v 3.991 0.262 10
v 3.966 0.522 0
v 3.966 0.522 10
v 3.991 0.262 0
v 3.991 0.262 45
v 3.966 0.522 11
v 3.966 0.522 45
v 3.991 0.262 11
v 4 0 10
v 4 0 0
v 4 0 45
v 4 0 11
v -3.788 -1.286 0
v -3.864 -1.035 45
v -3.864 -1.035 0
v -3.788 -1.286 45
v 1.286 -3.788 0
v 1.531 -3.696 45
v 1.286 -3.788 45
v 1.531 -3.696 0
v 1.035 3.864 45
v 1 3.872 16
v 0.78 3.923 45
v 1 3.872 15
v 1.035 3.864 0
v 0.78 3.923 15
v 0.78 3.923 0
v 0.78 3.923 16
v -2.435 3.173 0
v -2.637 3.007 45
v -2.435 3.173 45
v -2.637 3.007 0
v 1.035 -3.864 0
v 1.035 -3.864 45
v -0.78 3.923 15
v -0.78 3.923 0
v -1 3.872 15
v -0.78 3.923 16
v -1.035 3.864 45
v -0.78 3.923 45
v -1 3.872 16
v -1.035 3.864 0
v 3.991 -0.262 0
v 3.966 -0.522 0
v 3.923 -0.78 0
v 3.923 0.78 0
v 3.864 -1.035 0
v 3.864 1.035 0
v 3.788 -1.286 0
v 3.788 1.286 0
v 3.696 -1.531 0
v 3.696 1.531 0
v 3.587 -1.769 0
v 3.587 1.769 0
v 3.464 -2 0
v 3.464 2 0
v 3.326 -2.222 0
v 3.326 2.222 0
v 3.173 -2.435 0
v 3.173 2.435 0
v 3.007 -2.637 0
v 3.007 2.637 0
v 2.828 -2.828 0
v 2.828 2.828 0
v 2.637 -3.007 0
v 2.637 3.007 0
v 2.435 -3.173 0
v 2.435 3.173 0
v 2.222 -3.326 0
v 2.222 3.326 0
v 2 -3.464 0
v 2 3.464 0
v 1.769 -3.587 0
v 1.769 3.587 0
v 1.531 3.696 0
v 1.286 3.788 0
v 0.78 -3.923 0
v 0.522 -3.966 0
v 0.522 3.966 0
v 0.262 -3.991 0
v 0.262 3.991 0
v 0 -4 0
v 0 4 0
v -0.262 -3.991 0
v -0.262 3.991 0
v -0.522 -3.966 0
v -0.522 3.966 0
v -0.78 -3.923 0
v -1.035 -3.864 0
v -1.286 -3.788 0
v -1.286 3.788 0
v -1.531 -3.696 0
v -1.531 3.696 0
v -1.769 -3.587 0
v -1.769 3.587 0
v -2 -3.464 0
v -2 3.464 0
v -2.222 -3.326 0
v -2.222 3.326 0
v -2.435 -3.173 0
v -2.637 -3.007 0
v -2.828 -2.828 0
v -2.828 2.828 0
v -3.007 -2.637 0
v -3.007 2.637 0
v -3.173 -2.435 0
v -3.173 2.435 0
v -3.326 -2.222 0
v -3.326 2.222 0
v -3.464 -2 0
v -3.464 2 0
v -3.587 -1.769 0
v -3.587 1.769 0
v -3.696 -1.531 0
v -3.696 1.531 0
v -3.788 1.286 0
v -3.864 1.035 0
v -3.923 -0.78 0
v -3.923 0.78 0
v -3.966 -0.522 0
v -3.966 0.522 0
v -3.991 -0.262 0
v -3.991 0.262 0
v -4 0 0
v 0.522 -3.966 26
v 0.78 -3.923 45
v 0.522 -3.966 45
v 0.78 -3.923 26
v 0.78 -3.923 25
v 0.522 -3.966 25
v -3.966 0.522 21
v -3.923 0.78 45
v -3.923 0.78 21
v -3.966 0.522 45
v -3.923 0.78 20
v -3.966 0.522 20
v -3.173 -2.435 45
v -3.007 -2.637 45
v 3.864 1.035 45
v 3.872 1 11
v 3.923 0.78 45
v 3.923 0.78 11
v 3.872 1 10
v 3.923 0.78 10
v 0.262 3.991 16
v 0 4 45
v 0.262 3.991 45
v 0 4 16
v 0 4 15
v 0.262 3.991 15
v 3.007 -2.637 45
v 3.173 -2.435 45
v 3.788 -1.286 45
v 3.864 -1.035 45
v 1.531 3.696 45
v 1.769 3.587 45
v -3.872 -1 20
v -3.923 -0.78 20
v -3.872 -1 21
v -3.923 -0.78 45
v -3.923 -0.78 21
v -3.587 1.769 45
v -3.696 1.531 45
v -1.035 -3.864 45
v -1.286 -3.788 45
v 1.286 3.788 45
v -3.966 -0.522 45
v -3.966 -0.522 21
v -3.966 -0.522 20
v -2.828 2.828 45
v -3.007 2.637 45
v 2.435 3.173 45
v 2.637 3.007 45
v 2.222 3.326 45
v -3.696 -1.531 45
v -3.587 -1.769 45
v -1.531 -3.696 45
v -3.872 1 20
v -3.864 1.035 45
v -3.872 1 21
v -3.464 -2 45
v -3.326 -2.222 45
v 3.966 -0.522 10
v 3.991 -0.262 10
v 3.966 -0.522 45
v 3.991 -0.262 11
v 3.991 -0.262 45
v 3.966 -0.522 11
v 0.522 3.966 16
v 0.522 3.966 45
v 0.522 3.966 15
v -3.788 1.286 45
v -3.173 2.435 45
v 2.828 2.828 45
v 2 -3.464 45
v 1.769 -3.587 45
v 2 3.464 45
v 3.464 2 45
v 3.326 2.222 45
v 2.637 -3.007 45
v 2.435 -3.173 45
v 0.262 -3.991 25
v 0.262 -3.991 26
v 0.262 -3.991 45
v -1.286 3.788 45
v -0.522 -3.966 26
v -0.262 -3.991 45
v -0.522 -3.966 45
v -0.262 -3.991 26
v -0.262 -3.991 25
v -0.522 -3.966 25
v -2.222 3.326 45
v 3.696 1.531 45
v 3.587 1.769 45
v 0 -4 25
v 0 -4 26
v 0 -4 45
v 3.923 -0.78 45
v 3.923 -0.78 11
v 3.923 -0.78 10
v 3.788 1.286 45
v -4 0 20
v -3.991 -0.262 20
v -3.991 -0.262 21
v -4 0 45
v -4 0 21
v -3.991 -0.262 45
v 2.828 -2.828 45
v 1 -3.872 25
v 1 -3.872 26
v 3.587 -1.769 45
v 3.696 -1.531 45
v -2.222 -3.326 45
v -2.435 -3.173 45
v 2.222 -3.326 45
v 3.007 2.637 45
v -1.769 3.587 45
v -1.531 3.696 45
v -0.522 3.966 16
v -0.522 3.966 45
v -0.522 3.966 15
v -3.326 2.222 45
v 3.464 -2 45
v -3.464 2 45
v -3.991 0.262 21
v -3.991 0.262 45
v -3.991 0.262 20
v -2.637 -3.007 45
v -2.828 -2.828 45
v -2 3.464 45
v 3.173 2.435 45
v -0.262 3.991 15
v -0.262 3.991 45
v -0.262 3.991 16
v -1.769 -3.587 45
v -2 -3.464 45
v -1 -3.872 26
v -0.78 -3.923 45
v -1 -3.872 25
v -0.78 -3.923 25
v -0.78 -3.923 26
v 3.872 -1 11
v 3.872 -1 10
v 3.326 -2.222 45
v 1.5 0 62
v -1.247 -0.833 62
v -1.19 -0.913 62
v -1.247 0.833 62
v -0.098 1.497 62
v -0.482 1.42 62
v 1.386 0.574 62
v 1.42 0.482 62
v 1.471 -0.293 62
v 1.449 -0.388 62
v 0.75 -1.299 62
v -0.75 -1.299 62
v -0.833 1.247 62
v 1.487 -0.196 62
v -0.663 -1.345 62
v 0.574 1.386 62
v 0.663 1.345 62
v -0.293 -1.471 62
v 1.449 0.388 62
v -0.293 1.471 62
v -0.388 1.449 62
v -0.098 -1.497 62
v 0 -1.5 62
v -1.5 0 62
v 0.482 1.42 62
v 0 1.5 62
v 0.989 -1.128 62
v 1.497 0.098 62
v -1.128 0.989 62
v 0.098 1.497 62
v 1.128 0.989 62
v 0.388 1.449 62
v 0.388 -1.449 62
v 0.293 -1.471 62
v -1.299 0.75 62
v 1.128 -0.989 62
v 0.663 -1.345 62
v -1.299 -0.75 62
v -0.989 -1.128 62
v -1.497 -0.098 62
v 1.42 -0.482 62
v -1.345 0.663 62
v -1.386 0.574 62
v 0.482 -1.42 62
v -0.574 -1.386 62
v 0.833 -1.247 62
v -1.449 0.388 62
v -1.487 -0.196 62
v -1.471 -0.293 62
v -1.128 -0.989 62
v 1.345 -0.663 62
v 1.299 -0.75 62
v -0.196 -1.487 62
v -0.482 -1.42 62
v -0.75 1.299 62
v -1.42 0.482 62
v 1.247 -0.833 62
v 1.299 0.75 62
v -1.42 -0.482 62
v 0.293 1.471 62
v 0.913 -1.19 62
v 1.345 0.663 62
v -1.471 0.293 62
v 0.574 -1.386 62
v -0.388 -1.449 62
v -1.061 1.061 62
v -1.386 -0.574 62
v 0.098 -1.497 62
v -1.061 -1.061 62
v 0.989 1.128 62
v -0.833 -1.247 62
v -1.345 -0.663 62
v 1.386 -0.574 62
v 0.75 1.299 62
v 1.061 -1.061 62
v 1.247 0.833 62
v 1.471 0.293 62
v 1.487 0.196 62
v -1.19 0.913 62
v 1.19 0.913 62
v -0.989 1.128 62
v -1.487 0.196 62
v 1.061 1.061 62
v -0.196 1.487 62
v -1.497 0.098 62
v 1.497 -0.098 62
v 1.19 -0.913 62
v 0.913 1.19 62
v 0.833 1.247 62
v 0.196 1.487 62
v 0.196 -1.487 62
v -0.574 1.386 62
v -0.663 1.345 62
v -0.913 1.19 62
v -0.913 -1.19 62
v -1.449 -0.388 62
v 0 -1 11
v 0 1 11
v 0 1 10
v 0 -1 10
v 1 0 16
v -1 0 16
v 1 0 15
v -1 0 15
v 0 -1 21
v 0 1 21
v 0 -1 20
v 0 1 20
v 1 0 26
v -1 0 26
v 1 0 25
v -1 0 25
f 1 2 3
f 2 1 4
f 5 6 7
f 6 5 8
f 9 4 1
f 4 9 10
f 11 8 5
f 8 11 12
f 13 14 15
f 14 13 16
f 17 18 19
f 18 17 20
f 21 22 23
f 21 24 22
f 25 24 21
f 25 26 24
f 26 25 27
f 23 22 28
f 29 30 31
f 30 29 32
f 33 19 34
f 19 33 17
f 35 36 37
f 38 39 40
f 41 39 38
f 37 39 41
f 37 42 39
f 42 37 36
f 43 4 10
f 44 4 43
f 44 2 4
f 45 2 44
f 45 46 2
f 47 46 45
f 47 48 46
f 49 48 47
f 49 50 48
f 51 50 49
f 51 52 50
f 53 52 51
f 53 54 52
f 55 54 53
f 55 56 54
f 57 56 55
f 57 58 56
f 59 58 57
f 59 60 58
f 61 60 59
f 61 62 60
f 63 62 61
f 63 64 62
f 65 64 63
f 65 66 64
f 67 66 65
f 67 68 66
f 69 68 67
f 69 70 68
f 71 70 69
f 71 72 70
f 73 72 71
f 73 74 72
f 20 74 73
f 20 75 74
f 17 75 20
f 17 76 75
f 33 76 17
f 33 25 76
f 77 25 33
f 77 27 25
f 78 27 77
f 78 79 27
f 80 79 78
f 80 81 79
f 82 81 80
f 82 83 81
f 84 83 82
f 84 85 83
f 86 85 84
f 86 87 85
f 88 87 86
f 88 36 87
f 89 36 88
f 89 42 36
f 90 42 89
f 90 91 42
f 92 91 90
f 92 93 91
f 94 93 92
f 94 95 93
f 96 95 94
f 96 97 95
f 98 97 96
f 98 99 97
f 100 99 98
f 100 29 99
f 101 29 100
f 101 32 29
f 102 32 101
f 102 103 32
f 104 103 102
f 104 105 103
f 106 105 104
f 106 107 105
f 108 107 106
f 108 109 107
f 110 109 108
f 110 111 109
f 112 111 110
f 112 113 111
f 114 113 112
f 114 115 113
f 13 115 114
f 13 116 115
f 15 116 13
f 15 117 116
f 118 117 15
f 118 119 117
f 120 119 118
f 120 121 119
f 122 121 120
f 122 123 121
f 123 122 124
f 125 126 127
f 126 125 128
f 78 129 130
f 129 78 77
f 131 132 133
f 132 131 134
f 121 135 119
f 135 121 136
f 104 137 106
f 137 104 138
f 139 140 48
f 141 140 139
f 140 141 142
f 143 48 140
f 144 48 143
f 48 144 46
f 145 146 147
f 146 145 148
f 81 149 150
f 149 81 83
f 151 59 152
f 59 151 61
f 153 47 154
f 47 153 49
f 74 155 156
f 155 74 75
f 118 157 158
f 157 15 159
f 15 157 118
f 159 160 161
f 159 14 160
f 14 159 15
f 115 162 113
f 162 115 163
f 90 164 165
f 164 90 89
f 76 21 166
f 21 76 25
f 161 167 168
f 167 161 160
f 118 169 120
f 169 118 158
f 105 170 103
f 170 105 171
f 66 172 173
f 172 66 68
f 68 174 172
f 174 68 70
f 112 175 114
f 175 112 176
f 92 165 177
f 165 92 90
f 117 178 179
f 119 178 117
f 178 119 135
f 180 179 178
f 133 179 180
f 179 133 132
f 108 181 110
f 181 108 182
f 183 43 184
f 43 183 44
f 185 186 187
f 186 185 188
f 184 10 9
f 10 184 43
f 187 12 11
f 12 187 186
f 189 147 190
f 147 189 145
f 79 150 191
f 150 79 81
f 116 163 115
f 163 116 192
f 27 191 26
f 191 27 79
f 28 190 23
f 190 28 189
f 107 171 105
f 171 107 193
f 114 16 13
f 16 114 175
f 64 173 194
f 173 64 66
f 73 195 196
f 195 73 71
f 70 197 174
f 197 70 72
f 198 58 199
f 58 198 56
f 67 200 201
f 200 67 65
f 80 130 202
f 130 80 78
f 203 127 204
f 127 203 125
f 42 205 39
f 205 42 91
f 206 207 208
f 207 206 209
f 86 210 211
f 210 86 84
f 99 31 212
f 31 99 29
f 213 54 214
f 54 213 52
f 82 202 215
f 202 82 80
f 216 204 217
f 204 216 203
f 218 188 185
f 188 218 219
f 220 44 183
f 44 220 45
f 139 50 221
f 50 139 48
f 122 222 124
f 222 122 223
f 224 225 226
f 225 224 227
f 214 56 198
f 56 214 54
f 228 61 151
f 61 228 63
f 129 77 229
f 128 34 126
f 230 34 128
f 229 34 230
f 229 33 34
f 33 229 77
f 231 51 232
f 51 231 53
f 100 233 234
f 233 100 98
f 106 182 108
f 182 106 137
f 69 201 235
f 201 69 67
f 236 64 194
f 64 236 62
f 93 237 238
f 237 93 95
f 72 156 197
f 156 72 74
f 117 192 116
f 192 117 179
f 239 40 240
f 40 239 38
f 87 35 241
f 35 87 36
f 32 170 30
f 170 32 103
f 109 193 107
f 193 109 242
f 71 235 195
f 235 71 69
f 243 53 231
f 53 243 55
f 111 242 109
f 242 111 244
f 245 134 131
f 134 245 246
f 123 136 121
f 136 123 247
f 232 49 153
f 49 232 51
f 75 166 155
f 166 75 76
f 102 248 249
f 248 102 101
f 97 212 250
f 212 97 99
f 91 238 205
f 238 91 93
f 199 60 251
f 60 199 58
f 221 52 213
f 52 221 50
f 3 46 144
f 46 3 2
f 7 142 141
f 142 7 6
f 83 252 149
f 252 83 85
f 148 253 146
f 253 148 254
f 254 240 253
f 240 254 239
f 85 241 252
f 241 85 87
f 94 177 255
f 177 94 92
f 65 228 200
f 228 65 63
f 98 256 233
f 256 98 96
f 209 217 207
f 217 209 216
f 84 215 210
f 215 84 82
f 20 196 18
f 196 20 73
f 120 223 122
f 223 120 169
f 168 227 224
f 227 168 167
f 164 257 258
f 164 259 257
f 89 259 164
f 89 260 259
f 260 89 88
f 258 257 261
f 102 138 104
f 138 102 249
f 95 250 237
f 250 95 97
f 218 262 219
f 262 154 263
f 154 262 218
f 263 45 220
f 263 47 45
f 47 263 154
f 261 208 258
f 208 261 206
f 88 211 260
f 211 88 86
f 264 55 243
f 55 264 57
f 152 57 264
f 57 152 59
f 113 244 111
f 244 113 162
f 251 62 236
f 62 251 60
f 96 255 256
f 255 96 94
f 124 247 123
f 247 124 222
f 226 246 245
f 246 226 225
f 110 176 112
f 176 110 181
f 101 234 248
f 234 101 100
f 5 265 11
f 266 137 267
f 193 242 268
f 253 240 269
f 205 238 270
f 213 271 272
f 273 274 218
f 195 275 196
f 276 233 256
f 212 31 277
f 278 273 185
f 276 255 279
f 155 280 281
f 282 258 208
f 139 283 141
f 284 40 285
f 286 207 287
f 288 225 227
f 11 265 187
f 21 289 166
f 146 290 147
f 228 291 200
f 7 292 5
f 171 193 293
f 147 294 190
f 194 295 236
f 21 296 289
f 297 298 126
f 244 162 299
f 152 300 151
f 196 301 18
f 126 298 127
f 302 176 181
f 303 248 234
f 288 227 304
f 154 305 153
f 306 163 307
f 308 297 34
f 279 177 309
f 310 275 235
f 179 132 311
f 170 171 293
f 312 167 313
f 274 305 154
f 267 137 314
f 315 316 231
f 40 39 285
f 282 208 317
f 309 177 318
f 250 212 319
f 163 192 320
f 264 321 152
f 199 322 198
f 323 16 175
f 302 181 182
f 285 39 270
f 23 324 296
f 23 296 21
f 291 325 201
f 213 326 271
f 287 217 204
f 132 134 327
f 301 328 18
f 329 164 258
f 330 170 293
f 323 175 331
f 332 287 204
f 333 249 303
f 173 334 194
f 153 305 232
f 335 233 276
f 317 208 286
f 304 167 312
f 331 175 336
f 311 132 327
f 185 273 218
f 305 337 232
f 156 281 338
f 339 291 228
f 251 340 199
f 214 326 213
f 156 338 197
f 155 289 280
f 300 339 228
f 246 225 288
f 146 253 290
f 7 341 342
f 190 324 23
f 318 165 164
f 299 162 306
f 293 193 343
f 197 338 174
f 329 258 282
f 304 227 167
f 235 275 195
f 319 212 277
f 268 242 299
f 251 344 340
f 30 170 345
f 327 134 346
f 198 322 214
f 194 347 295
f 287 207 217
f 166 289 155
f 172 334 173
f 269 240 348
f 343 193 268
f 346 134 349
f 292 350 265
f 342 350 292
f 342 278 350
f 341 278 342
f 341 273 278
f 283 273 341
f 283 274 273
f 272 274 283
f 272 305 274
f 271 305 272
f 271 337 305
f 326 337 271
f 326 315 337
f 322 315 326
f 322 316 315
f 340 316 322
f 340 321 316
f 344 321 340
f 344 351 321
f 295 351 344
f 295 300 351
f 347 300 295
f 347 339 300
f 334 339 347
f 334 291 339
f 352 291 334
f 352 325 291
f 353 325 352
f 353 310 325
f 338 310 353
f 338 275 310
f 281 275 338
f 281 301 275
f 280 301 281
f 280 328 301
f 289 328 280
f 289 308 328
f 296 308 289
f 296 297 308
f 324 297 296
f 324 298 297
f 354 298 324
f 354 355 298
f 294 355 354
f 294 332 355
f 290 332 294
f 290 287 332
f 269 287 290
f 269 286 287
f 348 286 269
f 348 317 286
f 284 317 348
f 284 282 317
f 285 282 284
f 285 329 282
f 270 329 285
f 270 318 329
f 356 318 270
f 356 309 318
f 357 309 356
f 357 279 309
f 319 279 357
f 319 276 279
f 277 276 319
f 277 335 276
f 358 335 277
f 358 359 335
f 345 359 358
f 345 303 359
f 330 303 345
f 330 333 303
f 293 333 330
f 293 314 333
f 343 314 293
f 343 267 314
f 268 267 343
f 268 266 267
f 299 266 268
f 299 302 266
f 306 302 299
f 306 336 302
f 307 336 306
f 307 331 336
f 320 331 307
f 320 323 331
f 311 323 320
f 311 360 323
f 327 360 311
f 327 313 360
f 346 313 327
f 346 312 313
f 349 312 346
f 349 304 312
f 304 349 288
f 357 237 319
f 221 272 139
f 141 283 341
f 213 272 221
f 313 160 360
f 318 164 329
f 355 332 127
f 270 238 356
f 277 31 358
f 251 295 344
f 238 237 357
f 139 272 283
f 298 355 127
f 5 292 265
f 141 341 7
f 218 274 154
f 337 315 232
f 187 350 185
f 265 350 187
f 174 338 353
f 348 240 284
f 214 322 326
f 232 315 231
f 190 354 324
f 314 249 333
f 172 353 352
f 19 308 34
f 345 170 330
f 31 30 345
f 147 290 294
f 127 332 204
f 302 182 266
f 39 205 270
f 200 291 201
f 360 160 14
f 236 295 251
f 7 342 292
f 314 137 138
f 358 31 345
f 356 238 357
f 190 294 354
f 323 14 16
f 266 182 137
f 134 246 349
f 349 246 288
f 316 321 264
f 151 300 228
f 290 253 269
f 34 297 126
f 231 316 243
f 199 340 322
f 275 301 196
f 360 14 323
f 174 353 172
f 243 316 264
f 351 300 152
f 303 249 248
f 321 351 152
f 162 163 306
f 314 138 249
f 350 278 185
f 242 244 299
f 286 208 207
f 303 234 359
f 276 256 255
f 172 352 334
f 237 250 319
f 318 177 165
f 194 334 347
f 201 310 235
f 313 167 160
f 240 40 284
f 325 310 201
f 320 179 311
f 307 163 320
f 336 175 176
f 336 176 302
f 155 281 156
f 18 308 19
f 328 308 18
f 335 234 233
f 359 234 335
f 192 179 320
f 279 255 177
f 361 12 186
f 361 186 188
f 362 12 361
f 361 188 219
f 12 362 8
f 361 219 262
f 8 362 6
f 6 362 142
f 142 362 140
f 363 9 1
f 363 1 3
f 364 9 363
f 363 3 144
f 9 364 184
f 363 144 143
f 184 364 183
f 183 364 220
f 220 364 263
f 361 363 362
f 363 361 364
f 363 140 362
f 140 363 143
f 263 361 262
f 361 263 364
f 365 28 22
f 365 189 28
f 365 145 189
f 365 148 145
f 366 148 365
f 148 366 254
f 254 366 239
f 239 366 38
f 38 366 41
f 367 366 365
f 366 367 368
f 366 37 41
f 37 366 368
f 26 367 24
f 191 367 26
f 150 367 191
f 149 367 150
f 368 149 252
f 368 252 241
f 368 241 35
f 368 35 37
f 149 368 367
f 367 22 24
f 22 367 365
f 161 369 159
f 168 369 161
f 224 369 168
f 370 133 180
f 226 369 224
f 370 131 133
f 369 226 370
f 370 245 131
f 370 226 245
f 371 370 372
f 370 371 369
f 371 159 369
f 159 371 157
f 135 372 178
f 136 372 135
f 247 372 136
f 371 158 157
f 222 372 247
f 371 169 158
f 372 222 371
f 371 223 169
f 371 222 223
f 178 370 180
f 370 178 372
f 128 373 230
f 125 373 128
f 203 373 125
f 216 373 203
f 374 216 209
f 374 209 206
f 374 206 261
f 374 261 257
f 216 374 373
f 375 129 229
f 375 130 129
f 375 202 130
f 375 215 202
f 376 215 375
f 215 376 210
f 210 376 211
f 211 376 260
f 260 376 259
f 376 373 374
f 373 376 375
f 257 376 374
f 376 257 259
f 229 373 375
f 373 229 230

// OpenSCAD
// Tissue-grinding pestle for a 1.5 mL microcentrifuge tube
// Print orientation: standing upright on the XY plane, z = 0 at the bottom.

// ---------------- Parameters ----------------
handle_d      = 8;     // handle diameter (mm)
handle_h      = 45;    // handle height (mm), z = 0 to 45

cone_top_d    = 8;     // cone diameter at the top (mm), z = 45
cone_bottom_d = 3;     // cone diameter at the bottom (mm), z = 62
cone_h        = 17;    // cone height (mm), z = 45 to 62

tip_d         = 3;     // rounded tip diameter (mm), sphere centre at z = 62

groove_count  = 4;     // number of circumferential grip grooves
groove_w      = 2;     // groove width along Z (mm)
groove_depth  = 1;     // groove depth into handle (mm)
groove_z      = [10, 15, 20, 25]; // groove centre heights (mm)

eps           = 0.5;   // cutter overshoot past faces (mm)
$fn           = 96;   // facet count for curved shapes

// ---------------- Model ----------------
difference() {
    union() {
        // (1) Cylindrical handle, z = 0 to 45
        cylinder(d = handle_d, h = handle_h);

        // (2) Tapering cone, z = 45 to 62
        translate([0, 0, handle_h])
            cylinder(d1 = cone_top_d, d2 = cone_bottom_d, h = cone_h);

        // (3) Rounded tip: 3 mm sphere centred at z = 62
        translate([0, 0, cone_bottom_d])
            sphere(d = tip_d);
    }

    // Grip grooves: circumferential cuts into the handle
    for (g = [0 : groove_count - 1]) {
        rotate([0, 0, g * 360 / groove_count])
            translate([0, -groove_w / 2, groove_z[g]])
                cube([handle_d / 2 + eps, groove_w, groove_depth]);
    }
}
